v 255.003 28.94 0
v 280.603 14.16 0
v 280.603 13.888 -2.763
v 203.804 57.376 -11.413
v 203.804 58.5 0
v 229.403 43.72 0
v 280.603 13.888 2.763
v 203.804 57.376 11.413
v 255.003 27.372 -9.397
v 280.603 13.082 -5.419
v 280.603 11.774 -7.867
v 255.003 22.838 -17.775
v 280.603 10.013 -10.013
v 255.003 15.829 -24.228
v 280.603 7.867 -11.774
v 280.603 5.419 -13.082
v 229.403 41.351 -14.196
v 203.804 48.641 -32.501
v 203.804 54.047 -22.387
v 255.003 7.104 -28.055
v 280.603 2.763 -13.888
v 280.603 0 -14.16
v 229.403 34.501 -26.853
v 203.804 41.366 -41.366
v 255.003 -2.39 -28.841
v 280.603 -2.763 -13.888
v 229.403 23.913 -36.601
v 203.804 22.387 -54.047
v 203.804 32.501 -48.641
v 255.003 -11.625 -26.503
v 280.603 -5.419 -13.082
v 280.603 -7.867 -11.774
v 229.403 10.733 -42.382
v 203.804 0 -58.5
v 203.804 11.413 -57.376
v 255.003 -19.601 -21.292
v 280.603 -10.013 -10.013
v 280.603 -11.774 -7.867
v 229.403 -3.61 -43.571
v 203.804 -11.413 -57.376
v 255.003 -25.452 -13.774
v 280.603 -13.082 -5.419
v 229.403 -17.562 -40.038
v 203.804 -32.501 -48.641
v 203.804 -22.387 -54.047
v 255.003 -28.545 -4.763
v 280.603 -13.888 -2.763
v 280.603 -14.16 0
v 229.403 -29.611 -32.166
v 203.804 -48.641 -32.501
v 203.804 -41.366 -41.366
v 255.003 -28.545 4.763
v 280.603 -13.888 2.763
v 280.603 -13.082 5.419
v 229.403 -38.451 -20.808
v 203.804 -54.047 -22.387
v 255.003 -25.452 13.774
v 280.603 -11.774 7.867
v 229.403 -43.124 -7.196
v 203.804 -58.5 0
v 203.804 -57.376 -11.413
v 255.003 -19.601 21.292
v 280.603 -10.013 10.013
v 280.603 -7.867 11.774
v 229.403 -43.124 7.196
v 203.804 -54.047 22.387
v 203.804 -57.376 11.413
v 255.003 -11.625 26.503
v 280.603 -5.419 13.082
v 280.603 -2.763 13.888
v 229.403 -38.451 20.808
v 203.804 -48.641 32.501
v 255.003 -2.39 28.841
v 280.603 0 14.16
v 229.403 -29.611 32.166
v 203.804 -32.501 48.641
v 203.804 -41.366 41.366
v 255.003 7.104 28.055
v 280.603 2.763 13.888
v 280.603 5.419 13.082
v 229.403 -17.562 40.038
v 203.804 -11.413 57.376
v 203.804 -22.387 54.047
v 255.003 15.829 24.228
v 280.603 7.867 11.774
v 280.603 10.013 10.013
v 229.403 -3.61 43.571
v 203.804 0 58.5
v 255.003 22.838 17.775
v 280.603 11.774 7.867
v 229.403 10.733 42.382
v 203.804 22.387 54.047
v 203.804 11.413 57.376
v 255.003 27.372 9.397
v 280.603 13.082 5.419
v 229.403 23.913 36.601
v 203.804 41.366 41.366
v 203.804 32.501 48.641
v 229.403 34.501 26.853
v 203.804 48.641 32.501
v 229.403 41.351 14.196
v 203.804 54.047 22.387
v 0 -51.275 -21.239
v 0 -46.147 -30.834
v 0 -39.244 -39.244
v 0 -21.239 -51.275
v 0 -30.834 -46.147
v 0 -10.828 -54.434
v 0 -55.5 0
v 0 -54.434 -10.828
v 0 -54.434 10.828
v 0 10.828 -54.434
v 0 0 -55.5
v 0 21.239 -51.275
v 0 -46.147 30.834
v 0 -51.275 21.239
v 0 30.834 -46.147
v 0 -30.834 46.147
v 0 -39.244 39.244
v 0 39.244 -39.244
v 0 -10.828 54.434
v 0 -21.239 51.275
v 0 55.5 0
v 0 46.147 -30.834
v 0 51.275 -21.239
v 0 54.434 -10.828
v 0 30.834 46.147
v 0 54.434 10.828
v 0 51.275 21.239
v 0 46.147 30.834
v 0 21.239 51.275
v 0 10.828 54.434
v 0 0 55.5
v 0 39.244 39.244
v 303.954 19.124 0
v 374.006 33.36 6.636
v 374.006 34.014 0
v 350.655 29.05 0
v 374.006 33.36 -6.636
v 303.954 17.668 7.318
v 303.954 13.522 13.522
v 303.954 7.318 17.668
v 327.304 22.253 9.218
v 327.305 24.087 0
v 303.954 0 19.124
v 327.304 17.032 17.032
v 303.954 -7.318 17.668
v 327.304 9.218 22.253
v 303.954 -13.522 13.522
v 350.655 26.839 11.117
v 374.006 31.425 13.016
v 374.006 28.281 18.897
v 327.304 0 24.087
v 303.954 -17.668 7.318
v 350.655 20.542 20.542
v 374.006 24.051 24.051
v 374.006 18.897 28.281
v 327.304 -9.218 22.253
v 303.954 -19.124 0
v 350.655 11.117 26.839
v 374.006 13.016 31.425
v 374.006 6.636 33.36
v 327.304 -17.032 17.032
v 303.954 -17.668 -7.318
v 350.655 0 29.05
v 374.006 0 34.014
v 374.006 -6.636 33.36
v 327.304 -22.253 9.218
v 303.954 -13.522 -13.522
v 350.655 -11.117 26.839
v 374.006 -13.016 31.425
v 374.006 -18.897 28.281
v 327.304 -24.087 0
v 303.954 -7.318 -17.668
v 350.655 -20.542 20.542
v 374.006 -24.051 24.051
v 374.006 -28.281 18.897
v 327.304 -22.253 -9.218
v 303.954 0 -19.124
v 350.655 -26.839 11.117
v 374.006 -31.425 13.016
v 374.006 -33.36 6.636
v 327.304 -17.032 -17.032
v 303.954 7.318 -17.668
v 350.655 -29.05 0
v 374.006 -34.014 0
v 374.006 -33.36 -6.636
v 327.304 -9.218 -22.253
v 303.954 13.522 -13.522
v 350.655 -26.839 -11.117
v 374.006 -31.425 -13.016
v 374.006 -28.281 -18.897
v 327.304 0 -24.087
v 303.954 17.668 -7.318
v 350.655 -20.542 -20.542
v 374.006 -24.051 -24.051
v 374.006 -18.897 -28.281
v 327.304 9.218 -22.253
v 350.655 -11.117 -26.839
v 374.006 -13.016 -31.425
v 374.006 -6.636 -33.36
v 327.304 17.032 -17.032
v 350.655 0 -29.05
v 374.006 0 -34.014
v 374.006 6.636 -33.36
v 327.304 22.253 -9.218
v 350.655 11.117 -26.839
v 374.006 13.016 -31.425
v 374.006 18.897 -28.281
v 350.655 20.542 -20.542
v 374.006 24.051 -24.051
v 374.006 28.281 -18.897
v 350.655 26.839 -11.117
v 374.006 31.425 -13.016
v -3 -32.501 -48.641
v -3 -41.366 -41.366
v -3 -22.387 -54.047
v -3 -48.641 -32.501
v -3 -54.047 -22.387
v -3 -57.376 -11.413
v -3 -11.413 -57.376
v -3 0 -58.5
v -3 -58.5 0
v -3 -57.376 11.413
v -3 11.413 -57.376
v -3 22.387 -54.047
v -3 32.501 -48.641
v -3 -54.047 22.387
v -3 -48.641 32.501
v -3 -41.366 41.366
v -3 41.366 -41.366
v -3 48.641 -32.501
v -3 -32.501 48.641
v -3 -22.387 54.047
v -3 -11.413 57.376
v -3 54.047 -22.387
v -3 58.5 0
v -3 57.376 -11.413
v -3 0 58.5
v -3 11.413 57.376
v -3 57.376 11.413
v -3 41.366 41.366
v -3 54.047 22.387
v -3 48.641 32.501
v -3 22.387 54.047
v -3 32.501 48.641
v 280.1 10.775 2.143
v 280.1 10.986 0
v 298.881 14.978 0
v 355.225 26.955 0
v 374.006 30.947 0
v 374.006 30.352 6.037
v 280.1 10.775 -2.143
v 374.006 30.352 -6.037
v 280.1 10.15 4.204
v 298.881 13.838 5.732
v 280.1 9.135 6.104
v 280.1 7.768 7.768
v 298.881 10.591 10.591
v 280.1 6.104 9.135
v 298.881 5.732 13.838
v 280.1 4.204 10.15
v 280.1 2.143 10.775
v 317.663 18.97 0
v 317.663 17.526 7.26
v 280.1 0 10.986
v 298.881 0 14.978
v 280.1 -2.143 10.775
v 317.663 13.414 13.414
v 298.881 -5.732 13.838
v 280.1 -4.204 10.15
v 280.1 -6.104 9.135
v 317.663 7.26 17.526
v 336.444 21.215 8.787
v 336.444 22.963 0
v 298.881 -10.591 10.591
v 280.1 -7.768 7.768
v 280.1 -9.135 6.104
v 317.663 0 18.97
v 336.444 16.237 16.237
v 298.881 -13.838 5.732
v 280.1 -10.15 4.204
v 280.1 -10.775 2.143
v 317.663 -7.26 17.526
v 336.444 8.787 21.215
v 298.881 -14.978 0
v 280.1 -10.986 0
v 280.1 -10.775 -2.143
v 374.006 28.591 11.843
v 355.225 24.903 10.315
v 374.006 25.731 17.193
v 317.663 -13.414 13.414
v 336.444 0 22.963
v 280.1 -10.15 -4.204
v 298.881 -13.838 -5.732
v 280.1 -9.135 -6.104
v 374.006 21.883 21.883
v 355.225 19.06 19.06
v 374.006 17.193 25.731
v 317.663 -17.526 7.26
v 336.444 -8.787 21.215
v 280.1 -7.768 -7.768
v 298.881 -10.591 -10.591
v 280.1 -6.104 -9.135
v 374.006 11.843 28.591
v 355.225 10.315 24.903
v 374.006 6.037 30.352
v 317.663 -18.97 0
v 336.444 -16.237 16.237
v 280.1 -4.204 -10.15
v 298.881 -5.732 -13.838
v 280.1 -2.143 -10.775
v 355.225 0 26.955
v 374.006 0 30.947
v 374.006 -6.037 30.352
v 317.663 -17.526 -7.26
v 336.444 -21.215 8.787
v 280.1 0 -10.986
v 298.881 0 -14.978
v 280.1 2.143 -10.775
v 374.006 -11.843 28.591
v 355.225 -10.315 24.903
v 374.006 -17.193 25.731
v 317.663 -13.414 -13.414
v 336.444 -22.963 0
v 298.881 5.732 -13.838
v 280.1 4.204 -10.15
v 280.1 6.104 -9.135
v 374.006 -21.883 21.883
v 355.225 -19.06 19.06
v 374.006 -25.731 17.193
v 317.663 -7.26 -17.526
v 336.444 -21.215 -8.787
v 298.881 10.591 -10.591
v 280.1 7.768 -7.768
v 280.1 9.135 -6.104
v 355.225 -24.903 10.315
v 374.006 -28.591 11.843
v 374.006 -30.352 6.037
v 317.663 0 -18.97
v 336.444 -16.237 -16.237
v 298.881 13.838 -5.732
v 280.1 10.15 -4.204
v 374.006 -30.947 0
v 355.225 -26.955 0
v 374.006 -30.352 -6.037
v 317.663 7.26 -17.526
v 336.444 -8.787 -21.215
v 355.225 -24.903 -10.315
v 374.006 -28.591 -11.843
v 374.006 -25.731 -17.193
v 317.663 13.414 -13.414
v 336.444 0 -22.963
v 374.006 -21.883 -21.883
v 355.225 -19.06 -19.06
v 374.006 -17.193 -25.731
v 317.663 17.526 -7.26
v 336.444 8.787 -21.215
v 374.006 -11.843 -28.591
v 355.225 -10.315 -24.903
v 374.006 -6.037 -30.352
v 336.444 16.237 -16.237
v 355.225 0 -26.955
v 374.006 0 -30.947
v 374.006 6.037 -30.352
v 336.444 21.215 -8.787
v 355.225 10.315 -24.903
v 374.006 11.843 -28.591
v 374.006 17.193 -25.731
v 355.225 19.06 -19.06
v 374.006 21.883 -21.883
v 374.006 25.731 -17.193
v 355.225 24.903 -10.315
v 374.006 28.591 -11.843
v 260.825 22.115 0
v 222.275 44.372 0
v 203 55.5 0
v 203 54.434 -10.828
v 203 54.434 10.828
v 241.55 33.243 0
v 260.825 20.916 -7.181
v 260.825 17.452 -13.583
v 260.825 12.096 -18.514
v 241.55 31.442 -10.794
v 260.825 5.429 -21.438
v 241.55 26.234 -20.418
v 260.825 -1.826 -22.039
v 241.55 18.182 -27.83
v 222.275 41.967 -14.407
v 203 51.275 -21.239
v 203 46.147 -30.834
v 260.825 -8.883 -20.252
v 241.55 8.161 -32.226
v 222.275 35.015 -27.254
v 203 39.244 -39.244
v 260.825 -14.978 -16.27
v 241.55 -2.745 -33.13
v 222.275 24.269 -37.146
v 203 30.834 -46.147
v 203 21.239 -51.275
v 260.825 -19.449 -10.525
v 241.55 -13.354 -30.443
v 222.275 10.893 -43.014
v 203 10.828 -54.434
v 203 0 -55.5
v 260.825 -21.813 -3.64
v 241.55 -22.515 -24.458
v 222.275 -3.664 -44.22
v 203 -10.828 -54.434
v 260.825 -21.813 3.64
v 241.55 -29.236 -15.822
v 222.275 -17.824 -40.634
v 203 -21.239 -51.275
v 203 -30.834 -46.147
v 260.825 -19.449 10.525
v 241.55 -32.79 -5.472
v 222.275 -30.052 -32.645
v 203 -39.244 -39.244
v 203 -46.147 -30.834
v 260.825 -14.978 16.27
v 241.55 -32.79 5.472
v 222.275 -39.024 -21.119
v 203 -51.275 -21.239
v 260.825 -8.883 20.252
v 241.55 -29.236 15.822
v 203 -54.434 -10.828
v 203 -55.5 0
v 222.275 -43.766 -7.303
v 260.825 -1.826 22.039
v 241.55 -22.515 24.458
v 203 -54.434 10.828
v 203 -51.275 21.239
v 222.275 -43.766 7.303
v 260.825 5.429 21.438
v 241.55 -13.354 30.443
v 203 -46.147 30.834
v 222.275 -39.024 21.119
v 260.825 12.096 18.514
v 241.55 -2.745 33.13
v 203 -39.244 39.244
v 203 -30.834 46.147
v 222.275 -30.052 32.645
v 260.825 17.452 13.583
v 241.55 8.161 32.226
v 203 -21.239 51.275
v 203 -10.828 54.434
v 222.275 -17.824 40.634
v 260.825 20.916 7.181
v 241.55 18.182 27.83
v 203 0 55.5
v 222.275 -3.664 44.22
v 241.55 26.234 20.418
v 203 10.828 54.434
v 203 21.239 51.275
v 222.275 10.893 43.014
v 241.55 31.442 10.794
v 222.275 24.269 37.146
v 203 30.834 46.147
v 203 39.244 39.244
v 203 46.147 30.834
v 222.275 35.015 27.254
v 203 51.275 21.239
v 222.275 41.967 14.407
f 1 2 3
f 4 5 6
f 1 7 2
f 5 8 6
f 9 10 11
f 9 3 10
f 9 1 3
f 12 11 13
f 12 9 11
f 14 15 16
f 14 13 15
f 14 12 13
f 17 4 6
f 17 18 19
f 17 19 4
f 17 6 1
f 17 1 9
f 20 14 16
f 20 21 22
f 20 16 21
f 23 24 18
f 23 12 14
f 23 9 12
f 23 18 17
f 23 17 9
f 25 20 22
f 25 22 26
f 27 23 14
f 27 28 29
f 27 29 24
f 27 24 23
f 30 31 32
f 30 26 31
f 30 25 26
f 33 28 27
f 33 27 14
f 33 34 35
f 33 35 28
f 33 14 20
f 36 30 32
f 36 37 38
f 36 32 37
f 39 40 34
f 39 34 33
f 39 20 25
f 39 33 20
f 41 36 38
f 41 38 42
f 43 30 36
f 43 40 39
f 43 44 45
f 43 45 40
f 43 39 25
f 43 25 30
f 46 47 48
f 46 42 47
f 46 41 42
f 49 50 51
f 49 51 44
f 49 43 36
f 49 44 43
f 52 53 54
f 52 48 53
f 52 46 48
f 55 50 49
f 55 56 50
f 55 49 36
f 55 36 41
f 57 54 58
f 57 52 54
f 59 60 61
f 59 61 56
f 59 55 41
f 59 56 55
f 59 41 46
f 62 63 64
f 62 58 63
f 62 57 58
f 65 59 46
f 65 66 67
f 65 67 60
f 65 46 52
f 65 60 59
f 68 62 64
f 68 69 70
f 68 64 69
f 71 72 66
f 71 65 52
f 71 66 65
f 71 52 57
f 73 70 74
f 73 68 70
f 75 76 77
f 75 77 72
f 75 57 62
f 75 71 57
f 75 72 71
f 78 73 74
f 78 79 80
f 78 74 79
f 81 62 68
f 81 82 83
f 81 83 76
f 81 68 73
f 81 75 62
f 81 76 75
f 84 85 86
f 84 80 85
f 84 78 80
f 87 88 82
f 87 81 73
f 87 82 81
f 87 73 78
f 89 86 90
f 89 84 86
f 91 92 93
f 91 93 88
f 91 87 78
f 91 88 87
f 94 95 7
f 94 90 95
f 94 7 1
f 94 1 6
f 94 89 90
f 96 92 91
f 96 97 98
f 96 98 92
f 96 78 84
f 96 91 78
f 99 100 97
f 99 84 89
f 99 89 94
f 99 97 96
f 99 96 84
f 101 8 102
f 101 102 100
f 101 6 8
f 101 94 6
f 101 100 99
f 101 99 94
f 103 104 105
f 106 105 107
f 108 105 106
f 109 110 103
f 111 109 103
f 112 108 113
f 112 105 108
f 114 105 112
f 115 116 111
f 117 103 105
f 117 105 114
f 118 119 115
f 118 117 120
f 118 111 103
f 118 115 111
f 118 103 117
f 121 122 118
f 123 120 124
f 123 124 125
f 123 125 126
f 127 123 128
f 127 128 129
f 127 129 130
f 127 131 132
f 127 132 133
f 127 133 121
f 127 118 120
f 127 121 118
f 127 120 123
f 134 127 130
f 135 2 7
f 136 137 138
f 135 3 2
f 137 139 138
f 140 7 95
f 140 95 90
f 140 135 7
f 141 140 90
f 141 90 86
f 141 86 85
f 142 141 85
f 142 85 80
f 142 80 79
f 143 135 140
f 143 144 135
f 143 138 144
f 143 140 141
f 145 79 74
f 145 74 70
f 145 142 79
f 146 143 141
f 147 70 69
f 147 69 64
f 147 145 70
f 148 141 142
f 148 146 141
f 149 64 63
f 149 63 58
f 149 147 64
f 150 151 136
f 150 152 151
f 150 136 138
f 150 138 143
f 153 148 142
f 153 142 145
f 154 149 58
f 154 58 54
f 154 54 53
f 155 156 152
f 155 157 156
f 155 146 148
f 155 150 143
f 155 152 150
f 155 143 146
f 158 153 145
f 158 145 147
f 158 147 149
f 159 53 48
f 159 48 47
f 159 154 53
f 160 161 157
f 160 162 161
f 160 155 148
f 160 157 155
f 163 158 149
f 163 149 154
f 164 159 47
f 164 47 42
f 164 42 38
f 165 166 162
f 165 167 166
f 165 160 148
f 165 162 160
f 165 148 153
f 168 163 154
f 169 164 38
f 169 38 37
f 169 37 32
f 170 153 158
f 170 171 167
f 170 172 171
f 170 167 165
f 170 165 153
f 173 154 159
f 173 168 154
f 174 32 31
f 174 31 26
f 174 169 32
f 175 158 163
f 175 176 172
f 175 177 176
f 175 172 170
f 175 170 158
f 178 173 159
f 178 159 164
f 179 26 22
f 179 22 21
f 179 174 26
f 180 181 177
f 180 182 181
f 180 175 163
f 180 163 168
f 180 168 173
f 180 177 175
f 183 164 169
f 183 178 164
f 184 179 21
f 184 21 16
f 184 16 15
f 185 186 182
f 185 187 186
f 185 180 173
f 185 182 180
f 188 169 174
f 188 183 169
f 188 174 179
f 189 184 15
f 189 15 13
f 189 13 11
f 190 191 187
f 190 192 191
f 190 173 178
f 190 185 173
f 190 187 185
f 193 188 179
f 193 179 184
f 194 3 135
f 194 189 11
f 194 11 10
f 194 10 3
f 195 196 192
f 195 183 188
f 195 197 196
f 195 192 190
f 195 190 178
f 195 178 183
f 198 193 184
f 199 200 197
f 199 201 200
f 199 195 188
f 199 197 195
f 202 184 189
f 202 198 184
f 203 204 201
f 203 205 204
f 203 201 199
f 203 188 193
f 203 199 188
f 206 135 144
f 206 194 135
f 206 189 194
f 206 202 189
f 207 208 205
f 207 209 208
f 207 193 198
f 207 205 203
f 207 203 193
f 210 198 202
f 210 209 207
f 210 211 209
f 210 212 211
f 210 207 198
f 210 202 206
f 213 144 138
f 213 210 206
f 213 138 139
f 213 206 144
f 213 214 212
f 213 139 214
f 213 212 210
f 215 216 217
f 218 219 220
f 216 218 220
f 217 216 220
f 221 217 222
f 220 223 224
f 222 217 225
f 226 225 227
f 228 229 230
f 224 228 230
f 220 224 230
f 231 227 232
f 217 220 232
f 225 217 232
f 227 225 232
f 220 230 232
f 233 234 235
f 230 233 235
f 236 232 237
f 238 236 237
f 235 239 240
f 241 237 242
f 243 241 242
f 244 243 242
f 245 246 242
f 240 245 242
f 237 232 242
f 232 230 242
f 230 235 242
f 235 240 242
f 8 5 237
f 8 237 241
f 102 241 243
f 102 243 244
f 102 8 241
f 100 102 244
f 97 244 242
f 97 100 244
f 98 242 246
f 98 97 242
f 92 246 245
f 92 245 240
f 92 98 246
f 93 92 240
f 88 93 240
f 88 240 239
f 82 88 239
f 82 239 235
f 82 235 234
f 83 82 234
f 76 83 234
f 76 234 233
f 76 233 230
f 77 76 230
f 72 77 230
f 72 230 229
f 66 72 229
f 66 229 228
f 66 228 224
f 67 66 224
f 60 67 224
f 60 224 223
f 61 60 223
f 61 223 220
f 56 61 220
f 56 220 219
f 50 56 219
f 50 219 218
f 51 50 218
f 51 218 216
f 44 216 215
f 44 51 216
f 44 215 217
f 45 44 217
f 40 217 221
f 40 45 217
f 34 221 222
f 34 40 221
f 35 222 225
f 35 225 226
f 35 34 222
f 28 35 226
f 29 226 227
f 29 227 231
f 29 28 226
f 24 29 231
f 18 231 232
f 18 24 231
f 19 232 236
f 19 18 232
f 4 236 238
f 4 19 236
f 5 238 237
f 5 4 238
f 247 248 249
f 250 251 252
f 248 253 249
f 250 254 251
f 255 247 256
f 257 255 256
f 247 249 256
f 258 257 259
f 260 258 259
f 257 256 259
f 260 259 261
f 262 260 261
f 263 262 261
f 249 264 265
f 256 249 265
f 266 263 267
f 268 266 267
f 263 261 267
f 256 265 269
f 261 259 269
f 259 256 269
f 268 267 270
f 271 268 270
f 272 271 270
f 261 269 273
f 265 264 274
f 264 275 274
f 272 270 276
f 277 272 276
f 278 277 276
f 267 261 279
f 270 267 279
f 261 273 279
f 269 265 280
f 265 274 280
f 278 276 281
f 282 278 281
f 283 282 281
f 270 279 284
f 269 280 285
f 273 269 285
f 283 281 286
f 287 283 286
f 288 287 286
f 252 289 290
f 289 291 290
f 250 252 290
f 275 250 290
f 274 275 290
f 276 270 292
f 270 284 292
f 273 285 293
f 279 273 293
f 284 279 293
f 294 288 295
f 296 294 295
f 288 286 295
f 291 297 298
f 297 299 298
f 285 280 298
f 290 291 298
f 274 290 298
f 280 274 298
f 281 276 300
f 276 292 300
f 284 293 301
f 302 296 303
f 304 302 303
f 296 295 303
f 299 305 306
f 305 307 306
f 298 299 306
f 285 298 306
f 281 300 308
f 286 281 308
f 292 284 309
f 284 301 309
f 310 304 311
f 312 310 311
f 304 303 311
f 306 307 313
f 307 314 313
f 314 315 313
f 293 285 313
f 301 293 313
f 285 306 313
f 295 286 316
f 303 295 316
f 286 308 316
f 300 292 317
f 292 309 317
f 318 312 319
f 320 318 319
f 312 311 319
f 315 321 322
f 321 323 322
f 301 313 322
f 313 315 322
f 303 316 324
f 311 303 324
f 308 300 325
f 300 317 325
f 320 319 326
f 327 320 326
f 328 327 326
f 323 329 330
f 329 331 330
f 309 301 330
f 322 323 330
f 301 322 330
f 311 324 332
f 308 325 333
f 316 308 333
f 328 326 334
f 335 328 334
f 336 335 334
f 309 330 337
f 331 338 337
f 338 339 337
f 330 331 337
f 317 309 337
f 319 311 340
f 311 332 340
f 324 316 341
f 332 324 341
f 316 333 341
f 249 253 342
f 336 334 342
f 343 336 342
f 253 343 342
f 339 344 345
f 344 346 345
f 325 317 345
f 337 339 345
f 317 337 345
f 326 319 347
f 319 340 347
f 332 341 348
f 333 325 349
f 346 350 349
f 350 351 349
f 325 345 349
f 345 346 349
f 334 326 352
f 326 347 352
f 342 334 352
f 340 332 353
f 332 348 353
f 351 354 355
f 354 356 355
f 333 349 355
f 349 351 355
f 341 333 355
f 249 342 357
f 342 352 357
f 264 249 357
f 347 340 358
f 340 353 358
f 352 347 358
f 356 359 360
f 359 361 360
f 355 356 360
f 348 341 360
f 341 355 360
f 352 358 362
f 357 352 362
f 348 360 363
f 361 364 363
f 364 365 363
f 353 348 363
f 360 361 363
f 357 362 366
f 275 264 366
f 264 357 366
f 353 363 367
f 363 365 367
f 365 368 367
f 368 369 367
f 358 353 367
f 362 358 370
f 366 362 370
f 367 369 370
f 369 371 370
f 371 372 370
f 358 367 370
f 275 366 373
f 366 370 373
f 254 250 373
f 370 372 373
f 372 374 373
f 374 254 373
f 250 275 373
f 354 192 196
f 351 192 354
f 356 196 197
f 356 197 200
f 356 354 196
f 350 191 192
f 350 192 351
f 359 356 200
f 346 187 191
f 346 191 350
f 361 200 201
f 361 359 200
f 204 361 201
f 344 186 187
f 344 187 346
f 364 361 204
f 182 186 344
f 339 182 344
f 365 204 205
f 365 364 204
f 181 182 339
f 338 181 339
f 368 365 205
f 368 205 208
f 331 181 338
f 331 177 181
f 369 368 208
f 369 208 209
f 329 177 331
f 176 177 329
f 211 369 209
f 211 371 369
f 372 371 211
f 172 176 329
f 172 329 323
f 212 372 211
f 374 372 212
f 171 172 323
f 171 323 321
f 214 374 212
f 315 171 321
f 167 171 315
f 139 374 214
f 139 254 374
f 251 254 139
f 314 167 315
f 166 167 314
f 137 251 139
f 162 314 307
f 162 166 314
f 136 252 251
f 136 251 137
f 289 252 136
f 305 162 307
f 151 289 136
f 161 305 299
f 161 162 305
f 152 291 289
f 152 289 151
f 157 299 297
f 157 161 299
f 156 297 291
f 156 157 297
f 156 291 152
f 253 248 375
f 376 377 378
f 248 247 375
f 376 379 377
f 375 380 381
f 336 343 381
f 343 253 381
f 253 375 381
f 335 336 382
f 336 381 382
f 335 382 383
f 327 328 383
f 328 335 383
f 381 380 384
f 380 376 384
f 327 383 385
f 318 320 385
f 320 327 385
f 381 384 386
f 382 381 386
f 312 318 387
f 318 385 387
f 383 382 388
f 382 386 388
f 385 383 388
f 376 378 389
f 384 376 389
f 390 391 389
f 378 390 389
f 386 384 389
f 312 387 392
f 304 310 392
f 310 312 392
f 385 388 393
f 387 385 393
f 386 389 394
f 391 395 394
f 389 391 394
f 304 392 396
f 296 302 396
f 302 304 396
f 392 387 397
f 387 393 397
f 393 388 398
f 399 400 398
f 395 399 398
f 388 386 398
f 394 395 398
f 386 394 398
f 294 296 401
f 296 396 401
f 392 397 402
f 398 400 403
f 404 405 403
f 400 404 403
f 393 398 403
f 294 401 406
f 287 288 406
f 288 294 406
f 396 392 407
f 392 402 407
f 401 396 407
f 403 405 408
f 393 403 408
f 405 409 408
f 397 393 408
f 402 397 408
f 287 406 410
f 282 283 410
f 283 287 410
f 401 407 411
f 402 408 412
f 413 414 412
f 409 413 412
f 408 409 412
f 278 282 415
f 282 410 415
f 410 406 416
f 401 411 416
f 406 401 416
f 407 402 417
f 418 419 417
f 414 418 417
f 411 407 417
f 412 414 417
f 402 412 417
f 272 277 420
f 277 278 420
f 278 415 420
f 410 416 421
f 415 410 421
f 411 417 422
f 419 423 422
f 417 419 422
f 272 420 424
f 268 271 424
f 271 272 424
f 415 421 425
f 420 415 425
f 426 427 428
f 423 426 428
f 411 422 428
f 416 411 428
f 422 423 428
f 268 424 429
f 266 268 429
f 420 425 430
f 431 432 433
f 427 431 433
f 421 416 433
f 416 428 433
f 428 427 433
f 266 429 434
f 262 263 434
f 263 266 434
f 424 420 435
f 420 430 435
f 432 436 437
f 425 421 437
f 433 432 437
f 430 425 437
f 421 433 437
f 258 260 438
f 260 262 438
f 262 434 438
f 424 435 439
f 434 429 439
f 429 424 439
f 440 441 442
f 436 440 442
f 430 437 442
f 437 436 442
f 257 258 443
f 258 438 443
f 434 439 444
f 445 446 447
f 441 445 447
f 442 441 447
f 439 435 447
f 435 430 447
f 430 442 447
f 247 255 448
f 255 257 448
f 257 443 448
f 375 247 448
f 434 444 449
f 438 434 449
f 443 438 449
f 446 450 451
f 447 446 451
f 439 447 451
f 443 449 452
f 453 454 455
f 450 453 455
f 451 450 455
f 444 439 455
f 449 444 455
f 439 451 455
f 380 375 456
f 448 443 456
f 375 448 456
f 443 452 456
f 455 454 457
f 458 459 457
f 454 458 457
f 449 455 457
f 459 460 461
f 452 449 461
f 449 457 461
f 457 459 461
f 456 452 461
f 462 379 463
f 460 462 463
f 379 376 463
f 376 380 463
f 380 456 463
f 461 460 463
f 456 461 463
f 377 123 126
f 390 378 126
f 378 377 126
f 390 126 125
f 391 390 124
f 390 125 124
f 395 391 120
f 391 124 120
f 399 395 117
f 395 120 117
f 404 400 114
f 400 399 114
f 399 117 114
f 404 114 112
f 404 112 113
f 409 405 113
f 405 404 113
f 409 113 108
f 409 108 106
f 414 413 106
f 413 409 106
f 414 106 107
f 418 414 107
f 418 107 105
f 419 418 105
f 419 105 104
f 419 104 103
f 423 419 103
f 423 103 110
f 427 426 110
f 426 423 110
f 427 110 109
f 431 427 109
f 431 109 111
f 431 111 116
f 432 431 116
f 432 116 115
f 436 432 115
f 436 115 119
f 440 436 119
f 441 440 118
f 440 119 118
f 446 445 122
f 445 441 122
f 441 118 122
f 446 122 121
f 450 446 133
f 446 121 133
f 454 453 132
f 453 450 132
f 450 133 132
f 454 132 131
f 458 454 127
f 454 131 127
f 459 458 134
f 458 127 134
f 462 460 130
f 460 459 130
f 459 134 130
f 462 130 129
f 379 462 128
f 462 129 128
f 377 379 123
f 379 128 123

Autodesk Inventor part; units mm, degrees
ref_plane "YZ Plane" through (0, 0, 0) normal (1, 0, 0) x (0, 1, 0)
ref_plane "XZ Plane" through (0, 0, 0) normal (0, 1, 0) x (-1, 0, 0)
ref_plane "XY Plane" through (0, 0, 0) normal (0, 0, 1) x (1, 0, 0)
sketch "Sketch1" plane through (0, 0, 0) normal (0, 0, 1) x (1, 0, 0)
  line L0 (203, 55.5) -> (0, 55.5)
  line L1 (0, 55.5) -> (0, 0)
  line L2 (203, 55.5) -> (280.1, 10.9863)
  line L3 (280.1, 10.9863) -> (374.0063, 30.9467)
  line L4 (-3, 0) -> (-3, 58.5)
  line L5 (-3, 58.5) -> (203.8038, 58.5)
  line L6 (203.8038, 58.5) -> (280.6027, 14.1602)
  line L7 (280.6027, 14.1602) -> (374.0063, 34.0137)
  line L8 (-3, 0) -> (0, 0)
  line L9 (374.0063, 34.0137) -> (374.0063, 30.9467)
  line L10 (-78.4013, 0) -> (449.4075, 0) projected
  dimension "d11" = 3
revolve "Revolution1" add sketch "Sketch1" angle 360 about axis through (-10, 0, 0) along (1, 0, 0)
properties part number "ESBOÇO 0.1 DO CAD DO MOTOR" material "Steel AISI316"
